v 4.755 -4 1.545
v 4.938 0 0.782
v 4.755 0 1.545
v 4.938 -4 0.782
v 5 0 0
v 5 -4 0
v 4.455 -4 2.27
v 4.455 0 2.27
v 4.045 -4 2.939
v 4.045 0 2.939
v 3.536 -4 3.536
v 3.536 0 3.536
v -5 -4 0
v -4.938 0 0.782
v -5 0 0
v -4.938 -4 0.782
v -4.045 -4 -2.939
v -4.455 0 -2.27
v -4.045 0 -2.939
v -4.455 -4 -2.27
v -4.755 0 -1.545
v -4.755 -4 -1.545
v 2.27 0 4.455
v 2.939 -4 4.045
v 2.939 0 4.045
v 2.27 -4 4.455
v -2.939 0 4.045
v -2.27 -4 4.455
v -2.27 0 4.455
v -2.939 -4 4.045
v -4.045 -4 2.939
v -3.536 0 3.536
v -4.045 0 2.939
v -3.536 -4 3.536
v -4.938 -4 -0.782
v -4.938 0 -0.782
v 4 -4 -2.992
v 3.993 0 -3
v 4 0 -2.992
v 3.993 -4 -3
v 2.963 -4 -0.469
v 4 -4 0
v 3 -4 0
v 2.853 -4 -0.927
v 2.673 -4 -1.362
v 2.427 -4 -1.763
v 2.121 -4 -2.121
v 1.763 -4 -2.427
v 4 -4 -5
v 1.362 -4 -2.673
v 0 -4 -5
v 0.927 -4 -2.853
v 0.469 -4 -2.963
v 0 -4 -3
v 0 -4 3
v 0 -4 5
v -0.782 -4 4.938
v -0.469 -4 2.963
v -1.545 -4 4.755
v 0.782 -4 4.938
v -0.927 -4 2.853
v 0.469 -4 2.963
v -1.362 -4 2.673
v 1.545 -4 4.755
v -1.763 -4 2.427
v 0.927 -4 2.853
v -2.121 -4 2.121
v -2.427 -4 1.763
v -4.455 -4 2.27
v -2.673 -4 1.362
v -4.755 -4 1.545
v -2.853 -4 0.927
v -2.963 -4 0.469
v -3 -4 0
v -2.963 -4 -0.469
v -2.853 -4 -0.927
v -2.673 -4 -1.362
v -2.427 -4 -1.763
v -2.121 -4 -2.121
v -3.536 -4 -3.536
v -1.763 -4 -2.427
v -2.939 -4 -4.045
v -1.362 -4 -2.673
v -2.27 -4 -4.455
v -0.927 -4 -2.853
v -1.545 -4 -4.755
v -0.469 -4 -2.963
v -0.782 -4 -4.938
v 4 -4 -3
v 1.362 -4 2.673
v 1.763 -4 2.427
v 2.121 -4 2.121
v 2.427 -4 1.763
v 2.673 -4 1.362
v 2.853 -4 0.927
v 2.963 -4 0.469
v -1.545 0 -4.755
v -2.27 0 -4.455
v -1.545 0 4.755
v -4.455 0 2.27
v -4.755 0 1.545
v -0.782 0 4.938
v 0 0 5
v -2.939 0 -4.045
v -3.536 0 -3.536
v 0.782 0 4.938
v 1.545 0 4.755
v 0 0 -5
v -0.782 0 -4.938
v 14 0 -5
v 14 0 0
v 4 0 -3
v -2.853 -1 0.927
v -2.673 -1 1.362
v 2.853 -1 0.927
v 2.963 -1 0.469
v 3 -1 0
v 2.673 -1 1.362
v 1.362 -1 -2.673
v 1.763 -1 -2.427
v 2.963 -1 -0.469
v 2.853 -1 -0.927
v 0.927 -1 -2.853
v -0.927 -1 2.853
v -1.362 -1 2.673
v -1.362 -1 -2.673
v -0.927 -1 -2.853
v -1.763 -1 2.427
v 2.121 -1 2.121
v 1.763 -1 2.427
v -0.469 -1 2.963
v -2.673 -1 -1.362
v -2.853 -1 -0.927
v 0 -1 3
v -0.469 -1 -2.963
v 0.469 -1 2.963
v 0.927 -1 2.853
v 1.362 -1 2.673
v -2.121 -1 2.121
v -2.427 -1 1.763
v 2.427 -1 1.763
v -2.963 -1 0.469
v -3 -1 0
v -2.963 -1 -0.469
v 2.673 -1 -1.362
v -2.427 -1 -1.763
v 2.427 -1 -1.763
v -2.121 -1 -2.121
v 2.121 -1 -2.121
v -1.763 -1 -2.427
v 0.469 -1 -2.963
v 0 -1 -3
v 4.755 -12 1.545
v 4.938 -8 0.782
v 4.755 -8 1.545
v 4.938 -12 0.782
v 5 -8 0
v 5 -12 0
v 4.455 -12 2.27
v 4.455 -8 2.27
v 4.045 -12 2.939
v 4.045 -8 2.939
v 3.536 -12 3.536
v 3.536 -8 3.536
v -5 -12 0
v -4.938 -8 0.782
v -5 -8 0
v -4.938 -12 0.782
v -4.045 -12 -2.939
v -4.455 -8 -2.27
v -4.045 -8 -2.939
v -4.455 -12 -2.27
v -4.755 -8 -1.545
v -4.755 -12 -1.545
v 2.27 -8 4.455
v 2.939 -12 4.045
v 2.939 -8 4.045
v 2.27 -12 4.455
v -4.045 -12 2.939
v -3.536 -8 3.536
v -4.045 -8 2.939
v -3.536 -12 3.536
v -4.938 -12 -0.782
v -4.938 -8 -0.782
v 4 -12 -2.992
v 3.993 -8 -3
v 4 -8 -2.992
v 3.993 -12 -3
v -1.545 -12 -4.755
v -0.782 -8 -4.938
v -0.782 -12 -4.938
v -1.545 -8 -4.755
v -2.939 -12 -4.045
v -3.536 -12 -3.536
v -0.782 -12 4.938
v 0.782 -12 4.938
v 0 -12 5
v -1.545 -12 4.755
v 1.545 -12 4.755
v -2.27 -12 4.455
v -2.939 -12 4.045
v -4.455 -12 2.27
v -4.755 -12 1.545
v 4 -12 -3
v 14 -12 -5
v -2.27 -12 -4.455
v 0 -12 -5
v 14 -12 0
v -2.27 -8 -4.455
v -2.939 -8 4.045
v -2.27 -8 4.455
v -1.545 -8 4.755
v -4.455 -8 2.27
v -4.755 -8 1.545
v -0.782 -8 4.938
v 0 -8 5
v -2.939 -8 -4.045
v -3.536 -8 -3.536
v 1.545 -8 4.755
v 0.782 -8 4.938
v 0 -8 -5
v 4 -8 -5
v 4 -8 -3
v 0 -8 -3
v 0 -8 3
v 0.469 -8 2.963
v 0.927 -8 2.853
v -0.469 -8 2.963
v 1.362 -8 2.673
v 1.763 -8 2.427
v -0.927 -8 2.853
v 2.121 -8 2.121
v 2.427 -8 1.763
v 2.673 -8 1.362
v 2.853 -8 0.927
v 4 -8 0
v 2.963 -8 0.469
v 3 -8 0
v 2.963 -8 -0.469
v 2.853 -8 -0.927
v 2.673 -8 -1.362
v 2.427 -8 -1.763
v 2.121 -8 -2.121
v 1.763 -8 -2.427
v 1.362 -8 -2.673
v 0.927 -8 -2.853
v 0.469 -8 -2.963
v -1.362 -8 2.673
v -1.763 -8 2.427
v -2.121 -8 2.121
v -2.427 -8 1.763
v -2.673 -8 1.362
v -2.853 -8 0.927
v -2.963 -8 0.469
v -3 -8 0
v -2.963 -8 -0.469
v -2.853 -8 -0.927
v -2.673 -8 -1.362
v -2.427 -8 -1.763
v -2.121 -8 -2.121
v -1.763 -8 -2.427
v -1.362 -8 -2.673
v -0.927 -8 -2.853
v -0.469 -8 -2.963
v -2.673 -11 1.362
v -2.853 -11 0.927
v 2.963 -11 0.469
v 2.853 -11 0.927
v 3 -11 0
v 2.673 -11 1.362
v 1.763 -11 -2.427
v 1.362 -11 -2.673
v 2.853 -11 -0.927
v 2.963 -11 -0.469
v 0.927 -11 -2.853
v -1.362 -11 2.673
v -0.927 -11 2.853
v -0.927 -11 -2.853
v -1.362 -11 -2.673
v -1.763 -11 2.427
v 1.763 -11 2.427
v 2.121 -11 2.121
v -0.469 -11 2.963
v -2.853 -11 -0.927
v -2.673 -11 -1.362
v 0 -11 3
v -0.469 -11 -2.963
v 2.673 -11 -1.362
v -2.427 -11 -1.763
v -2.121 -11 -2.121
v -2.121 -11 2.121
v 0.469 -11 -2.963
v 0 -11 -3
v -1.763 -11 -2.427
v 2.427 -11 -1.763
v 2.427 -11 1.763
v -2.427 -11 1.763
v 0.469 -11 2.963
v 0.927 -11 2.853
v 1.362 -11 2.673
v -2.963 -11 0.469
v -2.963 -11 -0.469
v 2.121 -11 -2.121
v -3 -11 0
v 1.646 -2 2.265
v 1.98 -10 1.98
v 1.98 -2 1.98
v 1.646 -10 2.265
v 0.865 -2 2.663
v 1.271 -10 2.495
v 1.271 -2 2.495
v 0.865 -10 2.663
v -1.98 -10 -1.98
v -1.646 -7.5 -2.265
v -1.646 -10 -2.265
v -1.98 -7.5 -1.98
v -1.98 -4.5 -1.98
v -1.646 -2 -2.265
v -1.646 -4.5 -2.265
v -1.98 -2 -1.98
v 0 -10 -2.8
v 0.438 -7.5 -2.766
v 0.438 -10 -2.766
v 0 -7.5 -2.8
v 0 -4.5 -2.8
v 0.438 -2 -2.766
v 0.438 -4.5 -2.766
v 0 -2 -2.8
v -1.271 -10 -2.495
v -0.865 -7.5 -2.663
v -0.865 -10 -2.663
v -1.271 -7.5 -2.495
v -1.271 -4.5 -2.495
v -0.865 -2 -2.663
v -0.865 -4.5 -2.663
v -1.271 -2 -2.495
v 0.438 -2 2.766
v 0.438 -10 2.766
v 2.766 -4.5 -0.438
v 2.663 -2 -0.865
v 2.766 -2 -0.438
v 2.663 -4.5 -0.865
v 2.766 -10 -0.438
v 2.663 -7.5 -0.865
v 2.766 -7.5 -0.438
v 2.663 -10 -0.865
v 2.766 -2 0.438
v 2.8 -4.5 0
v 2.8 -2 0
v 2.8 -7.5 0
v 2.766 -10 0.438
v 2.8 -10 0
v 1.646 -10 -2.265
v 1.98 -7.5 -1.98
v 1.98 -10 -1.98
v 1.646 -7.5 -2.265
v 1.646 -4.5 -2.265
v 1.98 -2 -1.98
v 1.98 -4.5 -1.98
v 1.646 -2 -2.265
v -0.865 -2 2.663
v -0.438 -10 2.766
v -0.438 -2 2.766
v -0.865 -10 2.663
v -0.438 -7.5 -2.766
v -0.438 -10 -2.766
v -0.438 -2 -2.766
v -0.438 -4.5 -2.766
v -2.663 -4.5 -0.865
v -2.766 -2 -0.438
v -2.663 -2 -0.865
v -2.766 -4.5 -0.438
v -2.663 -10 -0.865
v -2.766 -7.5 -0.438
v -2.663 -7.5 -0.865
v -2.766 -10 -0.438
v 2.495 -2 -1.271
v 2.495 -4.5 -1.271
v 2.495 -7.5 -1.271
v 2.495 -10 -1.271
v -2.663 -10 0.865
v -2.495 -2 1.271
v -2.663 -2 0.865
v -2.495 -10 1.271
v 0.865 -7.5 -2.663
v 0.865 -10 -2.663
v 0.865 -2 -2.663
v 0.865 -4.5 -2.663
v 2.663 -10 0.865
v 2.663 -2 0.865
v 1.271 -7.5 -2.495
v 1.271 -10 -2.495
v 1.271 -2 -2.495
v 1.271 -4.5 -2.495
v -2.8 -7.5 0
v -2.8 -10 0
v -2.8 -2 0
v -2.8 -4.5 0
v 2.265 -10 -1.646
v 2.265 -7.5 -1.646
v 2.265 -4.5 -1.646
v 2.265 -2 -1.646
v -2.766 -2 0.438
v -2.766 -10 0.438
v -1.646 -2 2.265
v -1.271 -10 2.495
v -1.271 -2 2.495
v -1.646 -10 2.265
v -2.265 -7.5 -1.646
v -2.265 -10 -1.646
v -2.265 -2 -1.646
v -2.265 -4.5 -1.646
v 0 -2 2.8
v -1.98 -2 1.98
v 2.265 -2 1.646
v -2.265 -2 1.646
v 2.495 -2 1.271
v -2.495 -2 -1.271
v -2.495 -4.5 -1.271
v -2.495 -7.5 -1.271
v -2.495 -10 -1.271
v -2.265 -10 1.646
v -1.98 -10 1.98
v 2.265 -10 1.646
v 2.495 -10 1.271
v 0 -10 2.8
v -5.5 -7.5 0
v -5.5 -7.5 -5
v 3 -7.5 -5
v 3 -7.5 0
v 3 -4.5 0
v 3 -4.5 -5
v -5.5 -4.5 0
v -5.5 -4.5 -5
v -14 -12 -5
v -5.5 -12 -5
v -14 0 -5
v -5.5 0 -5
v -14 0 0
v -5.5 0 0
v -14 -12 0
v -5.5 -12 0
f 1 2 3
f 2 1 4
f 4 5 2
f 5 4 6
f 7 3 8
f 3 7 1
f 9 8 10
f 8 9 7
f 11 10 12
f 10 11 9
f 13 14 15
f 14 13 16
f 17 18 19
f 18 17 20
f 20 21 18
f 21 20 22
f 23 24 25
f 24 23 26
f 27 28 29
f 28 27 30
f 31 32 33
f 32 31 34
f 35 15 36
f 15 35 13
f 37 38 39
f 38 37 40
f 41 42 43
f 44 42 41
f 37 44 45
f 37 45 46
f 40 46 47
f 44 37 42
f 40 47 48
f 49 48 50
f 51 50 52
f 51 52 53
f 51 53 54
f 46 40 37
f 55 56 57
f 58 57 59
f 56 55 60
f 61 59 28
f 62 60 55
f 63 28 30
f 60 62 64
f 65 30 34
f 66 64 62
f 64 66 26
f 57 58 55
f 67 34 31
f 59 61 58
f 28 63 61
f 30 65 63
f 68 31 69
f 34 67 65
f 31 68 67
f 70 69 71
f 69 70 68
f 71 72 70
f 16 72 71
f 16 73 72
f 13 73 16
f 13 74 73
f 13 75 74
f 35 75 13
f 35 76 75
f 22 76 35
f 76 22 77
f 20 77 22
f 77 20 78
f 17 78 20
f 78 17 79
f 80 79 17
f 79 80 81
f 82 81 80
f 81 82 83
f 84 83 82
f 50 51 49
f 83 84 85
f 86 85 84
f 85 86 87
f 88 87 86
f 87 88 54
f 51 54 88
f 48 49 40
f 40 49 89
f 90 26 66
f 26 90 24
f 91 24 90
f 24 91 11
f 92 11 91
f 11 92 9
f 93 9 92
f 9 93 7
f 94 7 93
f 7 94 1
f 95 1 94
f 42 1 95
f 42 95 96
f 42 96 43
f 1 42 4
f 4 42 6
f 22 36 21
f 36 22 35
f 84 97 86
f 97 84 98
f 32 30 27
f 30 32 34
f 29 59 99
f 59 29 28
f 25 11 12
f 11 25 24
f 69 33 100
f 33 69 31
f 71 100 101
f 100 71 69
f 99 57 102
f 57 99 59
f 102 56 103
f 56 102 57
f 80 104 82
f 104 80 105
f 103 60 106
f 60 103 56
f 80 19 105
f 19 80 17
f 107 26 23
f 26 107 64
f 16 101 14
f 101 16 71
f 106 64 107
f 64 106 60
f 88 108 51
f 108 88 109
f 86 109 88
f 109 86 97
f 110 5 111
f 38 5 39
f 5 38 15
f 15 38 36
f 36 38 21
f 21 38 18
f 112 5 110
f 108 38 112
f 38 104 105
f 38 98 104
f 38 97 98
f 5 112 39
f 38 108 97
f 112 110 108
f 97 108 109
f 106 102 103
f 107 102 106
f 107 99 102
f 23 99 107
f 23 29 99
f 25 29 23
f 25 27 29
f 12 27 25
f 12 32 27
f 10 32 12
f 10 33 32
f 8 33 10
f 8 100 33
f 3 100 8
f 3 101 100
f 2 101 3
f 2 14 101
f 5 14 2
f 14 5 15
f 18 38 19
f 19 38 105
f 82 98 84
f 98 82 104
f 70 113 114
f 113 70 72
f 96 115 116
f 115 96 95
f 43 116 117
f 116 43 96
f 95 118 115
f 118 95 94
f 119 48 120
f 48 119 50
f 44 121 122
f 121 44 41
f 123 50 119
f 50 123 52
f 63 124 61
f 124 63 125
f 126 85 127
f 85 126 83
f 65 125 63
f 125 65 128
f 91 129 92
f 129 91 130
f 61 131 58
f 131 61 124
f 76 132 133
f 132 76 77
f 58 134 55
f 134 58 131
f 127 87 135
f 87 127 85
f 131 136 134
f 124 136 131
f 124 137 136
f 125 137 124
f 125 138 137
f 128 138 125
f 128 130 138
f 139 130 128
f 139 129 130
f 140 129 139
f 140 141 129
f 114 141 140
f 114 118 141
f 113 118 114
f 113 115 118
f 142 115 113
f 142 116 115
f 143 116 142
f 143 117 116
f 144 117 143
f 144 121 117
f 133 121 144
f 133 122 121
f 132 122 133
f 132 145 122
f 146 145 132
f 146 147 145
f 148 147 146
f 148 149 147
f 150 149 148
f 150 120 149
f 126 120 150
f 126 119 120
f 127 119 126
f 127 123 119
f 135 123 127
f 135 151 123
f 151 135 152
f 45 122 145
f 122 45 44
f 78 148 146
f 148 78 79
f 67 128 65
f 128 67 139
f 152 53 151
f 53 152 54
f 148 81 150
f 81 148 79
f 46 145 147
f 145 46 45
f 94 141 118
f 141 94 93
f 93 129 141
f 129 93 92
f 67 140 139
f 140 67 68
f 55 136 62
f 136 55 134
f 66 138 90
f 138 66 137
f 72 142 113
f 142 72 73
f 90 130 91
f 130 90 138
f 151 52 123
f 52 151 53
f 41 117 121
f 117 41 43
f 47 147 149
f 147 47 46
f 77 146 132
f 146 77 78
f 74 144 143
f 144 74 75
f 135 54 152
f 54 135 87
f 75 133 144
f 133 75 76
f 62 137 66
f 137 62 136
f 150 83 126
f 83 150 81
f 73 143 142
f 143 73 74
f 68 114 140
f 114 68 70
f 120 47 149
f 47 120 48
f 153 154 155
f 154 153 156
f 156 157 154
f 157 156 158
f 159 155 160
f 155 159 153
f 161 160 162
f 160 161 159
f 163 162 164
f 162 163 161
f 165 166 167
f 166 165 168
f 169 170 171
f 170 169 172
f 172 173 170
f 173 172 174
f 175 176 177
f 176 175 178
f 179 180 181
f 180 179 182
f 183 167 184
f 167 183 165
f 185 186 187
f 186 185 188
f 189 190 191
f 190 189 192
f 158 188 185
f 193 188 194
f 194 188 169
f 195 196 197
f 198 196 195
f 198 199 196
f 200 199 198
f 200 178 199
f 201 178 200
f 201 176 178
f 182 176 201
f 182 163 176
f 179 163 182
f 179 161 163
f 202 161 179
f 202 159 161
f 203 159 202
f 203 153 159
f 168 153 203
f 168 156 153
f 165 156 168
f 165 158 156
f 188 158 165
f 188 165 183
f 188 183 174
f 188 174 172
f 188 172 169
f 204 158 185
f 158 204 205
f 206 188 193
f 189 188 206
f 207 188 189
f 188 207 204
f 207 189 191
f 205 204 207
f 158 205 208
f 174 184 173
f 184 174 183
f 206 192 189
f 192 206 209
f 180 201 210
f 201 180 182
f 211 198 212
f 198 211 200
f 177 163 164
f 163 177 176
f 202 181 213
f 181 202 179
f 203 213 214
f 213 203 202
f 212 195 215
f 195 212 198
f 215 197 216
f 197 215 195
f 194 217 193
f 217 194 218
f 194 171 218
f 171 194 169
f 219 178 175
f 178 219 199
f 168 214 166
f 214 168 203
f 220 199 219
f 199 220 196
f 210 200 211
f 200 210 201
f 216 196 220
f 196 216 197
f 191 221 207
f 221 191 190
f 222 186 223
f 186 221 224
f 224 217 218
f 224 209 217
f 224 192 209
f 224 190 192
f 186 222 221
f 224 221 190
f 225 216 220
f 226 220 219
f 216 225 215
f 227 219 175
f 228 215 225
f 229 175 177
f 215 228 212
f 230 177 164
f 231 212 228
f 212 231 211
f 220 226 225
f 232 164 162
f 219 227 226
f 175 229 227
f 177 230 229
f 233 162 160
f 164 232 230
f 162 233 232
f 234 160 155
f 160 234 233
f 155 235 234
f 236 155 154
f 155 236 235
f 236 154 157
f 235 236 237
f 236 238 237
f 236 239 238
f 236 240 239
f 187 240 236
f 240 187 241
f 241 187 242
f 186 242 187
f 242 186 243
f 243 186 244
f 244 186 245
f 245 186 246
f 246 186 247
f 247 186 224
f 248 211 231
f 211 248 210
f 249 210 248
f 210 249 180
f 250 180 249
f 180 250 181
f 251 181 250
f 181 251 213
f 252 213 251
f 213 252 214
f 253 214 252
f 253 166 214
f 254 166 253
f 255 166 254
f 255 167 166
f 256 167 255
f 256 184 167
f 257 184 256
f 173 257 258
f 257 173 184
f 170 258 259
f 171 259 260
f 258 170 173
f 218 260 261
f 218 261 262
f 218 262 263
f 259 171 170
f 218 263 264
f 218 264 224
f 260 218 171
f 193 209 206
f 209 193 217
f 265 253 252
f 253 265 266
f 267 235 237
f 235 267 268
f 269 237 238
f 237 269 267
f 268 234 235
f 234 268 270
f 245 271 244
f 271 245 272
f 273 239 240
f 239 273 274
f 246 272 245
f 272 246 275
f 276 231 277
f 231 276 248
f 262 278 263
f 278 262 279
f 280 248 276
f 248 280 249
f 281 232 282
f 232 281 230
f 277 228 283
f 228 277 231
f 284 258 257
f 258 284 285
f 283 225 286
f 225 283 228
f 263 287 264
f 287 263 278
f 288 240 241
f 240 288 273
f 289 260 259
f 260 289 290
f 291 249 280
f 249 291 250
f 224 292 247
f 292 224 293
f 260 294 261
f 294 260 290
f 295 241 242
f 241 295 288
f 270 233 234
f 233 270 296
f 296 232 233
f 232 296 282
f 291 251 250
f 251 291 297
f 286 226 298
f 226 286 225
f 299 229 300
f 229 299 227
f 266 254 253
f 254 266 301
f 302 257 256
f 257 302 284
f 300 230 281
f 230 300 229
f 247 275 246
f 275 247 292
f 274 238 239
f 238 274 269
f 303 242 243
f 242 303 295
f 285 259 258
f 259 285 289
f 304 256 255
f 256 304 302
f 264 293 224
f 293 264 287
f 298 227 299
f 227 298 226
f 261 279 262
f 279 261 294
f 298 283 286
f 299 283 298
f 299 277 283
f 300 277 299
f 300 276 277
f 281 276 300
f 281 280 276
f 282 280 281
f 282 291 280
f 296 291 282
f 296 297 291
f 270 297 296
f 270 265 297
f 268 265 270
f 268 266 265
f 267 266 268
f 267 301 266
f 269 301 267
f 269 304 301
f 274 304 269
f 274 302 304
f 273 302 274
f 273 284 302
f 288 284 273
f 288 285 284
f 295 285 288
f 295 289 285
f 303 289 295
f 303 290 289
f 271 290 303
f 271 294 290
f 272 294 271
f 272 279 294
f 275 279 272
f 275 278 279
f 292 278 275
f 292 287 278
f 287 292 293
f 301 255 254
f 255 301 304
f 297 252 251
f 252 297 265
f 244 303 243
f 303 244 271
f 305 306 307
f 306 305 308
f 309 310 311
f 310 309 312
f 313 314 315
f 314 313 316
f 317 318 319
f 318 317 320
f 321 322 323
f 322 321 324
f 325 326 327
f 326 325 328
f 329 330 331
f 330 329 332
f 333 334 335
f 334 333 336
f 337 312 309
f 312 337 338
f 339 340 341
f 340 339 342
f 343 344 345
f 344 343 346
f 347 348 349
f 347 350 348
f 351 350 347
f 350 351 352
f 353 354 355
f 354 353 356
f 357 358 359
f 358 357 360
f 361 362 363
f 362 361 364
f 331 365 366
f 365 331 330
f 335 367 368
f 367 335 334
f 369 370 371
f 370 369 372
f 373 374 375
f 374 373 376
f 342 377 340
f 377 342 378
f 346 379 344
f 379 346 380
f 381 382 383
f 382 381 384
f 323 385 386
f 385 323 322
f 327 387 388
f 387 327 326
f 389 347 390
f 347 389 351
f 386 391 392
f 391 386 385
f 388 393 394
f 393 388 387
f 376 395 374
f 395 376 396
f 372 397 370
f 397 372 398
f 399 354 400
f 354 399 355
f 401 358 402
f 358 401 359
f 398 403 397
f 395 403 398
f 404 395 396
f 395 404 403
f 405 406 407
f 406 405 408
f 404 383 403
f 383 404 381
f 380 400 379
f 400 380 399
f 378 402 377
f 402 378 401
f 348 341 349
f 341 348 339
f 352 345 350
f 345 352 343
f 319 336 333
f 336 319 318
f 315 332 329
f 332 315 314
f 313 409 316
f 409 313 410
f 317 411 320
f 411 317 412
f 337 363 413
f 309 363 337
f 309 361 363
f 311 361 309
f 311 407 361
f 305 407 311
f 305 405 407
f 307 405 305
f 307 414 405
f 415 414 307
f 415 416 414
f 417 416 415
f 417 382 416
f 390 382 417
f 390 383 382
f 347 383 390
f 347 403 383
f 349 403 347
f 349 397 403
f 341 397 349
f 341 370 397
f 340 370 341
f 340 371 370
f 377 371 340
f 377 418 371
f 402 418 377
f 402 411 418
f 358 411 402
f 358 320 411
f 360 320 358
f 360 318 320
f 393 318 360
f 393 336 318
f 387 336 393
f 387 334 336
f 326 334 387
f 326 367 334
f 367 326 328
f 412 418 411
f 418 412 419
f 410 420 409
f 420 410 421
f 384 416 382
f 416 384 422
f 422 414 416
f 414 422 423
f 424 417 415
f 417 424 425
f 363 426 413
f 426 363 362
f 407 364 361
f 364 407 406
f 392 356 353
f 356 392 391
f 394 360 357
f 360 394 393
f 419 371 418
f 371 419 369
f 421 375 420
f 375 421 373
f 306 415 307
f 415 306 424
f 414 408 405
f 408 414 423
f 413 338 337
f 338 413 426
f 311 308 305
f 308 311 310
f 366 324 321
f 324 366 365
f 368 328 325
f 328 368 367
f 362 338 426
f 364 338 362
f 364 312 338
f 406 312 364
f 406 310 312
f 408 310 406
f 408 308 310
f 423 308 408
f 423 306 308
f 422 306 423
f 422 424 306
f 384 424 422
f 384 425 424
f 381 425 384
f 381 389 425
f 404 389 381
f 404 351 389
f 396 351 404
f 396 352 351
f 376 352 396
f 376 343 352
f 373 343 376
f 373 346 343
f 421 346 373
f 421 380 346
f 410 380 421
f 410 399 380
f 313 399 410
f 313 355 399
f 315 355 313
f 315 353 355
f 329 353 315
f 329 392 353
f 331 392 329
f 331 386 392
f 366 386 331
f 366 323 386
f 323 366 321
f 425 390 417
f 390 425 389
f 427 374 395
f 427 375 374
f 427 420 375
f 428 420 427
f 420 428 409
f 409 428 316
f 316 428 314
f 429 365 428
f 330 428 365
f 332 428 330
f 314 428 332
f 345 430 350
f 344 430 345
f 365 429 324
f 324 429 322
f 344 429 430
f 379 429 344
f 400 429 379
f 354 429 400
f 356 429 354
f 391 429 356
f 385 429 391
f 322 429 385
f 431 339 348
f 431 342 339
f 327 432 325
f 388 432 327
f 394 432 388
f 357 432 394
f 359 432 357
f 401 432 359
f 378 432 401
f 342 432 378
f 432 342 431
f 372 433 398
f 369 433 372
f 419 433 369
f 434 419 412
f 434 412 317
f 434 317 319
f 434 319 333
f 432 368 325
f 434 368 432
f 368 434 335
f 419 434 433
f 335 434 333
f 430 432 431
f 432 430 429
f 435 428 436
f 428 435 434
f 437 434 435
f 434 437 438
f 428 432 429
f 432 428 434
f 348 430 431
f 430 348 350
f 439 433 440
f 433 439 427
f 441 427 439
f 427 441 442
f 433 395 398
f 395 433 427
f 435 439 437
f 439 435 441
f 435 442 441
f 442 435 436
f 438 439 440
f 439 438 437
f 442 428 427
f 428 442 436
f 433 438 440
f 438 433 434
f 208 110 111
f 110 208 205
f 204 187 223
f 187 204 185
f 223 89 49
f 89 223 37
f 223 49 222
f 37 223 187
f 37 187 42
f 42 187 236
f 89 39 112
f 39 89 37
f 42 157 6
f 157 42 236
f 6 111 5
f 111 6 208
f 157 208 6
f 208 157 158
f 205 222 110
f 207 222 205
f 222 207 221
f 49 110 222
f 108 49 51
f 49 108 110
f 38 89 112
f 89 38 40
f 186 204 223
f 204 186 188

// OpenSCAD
$fn=40;


rotate([90,0,0]) {

// female hinge cylinder bottom
// bottom is filled 1, then 3 is empty
difference() {
    cylinder(4, r=5);

    translate([0,0,1])
    cylinder(4, r=3);
}

// female hinge cylinder top
// top is filled 1, then 3 is empty
// hovering 4mm above the bottom female cylinder
difference() {
    translate([0, 0, 8])
    cylinder(4, r=5);

    translate([0, 0, 7])
    cylinder(4, r=3);
}

// big female plate
plate_thickness = 5;
translate([4, -plate_thickness, 0])
cube([10, plate_thickness, 12]);

// little plate
translate([0,-5,0])
cube([4.5, 2, 4]);

// little plate
translate([0,-5,8])
cube([4.5, 2, 4]);



rotate([0,0,180]) {
// male hinge cylinder middle
// 1-fill, 1 gap, 2, 4, 2, 1 gap, 1 fill.
translate([0, 0, 2])
cylinder(8, r=2.8);

// thin rect from male hinge
translate([-3, 0, 4.5])
cube([13, 5, 3]);

// big contact plate from male hinge
translate([5.5, 0, 0])
cube([8.5, 5, 12]);

}


}
